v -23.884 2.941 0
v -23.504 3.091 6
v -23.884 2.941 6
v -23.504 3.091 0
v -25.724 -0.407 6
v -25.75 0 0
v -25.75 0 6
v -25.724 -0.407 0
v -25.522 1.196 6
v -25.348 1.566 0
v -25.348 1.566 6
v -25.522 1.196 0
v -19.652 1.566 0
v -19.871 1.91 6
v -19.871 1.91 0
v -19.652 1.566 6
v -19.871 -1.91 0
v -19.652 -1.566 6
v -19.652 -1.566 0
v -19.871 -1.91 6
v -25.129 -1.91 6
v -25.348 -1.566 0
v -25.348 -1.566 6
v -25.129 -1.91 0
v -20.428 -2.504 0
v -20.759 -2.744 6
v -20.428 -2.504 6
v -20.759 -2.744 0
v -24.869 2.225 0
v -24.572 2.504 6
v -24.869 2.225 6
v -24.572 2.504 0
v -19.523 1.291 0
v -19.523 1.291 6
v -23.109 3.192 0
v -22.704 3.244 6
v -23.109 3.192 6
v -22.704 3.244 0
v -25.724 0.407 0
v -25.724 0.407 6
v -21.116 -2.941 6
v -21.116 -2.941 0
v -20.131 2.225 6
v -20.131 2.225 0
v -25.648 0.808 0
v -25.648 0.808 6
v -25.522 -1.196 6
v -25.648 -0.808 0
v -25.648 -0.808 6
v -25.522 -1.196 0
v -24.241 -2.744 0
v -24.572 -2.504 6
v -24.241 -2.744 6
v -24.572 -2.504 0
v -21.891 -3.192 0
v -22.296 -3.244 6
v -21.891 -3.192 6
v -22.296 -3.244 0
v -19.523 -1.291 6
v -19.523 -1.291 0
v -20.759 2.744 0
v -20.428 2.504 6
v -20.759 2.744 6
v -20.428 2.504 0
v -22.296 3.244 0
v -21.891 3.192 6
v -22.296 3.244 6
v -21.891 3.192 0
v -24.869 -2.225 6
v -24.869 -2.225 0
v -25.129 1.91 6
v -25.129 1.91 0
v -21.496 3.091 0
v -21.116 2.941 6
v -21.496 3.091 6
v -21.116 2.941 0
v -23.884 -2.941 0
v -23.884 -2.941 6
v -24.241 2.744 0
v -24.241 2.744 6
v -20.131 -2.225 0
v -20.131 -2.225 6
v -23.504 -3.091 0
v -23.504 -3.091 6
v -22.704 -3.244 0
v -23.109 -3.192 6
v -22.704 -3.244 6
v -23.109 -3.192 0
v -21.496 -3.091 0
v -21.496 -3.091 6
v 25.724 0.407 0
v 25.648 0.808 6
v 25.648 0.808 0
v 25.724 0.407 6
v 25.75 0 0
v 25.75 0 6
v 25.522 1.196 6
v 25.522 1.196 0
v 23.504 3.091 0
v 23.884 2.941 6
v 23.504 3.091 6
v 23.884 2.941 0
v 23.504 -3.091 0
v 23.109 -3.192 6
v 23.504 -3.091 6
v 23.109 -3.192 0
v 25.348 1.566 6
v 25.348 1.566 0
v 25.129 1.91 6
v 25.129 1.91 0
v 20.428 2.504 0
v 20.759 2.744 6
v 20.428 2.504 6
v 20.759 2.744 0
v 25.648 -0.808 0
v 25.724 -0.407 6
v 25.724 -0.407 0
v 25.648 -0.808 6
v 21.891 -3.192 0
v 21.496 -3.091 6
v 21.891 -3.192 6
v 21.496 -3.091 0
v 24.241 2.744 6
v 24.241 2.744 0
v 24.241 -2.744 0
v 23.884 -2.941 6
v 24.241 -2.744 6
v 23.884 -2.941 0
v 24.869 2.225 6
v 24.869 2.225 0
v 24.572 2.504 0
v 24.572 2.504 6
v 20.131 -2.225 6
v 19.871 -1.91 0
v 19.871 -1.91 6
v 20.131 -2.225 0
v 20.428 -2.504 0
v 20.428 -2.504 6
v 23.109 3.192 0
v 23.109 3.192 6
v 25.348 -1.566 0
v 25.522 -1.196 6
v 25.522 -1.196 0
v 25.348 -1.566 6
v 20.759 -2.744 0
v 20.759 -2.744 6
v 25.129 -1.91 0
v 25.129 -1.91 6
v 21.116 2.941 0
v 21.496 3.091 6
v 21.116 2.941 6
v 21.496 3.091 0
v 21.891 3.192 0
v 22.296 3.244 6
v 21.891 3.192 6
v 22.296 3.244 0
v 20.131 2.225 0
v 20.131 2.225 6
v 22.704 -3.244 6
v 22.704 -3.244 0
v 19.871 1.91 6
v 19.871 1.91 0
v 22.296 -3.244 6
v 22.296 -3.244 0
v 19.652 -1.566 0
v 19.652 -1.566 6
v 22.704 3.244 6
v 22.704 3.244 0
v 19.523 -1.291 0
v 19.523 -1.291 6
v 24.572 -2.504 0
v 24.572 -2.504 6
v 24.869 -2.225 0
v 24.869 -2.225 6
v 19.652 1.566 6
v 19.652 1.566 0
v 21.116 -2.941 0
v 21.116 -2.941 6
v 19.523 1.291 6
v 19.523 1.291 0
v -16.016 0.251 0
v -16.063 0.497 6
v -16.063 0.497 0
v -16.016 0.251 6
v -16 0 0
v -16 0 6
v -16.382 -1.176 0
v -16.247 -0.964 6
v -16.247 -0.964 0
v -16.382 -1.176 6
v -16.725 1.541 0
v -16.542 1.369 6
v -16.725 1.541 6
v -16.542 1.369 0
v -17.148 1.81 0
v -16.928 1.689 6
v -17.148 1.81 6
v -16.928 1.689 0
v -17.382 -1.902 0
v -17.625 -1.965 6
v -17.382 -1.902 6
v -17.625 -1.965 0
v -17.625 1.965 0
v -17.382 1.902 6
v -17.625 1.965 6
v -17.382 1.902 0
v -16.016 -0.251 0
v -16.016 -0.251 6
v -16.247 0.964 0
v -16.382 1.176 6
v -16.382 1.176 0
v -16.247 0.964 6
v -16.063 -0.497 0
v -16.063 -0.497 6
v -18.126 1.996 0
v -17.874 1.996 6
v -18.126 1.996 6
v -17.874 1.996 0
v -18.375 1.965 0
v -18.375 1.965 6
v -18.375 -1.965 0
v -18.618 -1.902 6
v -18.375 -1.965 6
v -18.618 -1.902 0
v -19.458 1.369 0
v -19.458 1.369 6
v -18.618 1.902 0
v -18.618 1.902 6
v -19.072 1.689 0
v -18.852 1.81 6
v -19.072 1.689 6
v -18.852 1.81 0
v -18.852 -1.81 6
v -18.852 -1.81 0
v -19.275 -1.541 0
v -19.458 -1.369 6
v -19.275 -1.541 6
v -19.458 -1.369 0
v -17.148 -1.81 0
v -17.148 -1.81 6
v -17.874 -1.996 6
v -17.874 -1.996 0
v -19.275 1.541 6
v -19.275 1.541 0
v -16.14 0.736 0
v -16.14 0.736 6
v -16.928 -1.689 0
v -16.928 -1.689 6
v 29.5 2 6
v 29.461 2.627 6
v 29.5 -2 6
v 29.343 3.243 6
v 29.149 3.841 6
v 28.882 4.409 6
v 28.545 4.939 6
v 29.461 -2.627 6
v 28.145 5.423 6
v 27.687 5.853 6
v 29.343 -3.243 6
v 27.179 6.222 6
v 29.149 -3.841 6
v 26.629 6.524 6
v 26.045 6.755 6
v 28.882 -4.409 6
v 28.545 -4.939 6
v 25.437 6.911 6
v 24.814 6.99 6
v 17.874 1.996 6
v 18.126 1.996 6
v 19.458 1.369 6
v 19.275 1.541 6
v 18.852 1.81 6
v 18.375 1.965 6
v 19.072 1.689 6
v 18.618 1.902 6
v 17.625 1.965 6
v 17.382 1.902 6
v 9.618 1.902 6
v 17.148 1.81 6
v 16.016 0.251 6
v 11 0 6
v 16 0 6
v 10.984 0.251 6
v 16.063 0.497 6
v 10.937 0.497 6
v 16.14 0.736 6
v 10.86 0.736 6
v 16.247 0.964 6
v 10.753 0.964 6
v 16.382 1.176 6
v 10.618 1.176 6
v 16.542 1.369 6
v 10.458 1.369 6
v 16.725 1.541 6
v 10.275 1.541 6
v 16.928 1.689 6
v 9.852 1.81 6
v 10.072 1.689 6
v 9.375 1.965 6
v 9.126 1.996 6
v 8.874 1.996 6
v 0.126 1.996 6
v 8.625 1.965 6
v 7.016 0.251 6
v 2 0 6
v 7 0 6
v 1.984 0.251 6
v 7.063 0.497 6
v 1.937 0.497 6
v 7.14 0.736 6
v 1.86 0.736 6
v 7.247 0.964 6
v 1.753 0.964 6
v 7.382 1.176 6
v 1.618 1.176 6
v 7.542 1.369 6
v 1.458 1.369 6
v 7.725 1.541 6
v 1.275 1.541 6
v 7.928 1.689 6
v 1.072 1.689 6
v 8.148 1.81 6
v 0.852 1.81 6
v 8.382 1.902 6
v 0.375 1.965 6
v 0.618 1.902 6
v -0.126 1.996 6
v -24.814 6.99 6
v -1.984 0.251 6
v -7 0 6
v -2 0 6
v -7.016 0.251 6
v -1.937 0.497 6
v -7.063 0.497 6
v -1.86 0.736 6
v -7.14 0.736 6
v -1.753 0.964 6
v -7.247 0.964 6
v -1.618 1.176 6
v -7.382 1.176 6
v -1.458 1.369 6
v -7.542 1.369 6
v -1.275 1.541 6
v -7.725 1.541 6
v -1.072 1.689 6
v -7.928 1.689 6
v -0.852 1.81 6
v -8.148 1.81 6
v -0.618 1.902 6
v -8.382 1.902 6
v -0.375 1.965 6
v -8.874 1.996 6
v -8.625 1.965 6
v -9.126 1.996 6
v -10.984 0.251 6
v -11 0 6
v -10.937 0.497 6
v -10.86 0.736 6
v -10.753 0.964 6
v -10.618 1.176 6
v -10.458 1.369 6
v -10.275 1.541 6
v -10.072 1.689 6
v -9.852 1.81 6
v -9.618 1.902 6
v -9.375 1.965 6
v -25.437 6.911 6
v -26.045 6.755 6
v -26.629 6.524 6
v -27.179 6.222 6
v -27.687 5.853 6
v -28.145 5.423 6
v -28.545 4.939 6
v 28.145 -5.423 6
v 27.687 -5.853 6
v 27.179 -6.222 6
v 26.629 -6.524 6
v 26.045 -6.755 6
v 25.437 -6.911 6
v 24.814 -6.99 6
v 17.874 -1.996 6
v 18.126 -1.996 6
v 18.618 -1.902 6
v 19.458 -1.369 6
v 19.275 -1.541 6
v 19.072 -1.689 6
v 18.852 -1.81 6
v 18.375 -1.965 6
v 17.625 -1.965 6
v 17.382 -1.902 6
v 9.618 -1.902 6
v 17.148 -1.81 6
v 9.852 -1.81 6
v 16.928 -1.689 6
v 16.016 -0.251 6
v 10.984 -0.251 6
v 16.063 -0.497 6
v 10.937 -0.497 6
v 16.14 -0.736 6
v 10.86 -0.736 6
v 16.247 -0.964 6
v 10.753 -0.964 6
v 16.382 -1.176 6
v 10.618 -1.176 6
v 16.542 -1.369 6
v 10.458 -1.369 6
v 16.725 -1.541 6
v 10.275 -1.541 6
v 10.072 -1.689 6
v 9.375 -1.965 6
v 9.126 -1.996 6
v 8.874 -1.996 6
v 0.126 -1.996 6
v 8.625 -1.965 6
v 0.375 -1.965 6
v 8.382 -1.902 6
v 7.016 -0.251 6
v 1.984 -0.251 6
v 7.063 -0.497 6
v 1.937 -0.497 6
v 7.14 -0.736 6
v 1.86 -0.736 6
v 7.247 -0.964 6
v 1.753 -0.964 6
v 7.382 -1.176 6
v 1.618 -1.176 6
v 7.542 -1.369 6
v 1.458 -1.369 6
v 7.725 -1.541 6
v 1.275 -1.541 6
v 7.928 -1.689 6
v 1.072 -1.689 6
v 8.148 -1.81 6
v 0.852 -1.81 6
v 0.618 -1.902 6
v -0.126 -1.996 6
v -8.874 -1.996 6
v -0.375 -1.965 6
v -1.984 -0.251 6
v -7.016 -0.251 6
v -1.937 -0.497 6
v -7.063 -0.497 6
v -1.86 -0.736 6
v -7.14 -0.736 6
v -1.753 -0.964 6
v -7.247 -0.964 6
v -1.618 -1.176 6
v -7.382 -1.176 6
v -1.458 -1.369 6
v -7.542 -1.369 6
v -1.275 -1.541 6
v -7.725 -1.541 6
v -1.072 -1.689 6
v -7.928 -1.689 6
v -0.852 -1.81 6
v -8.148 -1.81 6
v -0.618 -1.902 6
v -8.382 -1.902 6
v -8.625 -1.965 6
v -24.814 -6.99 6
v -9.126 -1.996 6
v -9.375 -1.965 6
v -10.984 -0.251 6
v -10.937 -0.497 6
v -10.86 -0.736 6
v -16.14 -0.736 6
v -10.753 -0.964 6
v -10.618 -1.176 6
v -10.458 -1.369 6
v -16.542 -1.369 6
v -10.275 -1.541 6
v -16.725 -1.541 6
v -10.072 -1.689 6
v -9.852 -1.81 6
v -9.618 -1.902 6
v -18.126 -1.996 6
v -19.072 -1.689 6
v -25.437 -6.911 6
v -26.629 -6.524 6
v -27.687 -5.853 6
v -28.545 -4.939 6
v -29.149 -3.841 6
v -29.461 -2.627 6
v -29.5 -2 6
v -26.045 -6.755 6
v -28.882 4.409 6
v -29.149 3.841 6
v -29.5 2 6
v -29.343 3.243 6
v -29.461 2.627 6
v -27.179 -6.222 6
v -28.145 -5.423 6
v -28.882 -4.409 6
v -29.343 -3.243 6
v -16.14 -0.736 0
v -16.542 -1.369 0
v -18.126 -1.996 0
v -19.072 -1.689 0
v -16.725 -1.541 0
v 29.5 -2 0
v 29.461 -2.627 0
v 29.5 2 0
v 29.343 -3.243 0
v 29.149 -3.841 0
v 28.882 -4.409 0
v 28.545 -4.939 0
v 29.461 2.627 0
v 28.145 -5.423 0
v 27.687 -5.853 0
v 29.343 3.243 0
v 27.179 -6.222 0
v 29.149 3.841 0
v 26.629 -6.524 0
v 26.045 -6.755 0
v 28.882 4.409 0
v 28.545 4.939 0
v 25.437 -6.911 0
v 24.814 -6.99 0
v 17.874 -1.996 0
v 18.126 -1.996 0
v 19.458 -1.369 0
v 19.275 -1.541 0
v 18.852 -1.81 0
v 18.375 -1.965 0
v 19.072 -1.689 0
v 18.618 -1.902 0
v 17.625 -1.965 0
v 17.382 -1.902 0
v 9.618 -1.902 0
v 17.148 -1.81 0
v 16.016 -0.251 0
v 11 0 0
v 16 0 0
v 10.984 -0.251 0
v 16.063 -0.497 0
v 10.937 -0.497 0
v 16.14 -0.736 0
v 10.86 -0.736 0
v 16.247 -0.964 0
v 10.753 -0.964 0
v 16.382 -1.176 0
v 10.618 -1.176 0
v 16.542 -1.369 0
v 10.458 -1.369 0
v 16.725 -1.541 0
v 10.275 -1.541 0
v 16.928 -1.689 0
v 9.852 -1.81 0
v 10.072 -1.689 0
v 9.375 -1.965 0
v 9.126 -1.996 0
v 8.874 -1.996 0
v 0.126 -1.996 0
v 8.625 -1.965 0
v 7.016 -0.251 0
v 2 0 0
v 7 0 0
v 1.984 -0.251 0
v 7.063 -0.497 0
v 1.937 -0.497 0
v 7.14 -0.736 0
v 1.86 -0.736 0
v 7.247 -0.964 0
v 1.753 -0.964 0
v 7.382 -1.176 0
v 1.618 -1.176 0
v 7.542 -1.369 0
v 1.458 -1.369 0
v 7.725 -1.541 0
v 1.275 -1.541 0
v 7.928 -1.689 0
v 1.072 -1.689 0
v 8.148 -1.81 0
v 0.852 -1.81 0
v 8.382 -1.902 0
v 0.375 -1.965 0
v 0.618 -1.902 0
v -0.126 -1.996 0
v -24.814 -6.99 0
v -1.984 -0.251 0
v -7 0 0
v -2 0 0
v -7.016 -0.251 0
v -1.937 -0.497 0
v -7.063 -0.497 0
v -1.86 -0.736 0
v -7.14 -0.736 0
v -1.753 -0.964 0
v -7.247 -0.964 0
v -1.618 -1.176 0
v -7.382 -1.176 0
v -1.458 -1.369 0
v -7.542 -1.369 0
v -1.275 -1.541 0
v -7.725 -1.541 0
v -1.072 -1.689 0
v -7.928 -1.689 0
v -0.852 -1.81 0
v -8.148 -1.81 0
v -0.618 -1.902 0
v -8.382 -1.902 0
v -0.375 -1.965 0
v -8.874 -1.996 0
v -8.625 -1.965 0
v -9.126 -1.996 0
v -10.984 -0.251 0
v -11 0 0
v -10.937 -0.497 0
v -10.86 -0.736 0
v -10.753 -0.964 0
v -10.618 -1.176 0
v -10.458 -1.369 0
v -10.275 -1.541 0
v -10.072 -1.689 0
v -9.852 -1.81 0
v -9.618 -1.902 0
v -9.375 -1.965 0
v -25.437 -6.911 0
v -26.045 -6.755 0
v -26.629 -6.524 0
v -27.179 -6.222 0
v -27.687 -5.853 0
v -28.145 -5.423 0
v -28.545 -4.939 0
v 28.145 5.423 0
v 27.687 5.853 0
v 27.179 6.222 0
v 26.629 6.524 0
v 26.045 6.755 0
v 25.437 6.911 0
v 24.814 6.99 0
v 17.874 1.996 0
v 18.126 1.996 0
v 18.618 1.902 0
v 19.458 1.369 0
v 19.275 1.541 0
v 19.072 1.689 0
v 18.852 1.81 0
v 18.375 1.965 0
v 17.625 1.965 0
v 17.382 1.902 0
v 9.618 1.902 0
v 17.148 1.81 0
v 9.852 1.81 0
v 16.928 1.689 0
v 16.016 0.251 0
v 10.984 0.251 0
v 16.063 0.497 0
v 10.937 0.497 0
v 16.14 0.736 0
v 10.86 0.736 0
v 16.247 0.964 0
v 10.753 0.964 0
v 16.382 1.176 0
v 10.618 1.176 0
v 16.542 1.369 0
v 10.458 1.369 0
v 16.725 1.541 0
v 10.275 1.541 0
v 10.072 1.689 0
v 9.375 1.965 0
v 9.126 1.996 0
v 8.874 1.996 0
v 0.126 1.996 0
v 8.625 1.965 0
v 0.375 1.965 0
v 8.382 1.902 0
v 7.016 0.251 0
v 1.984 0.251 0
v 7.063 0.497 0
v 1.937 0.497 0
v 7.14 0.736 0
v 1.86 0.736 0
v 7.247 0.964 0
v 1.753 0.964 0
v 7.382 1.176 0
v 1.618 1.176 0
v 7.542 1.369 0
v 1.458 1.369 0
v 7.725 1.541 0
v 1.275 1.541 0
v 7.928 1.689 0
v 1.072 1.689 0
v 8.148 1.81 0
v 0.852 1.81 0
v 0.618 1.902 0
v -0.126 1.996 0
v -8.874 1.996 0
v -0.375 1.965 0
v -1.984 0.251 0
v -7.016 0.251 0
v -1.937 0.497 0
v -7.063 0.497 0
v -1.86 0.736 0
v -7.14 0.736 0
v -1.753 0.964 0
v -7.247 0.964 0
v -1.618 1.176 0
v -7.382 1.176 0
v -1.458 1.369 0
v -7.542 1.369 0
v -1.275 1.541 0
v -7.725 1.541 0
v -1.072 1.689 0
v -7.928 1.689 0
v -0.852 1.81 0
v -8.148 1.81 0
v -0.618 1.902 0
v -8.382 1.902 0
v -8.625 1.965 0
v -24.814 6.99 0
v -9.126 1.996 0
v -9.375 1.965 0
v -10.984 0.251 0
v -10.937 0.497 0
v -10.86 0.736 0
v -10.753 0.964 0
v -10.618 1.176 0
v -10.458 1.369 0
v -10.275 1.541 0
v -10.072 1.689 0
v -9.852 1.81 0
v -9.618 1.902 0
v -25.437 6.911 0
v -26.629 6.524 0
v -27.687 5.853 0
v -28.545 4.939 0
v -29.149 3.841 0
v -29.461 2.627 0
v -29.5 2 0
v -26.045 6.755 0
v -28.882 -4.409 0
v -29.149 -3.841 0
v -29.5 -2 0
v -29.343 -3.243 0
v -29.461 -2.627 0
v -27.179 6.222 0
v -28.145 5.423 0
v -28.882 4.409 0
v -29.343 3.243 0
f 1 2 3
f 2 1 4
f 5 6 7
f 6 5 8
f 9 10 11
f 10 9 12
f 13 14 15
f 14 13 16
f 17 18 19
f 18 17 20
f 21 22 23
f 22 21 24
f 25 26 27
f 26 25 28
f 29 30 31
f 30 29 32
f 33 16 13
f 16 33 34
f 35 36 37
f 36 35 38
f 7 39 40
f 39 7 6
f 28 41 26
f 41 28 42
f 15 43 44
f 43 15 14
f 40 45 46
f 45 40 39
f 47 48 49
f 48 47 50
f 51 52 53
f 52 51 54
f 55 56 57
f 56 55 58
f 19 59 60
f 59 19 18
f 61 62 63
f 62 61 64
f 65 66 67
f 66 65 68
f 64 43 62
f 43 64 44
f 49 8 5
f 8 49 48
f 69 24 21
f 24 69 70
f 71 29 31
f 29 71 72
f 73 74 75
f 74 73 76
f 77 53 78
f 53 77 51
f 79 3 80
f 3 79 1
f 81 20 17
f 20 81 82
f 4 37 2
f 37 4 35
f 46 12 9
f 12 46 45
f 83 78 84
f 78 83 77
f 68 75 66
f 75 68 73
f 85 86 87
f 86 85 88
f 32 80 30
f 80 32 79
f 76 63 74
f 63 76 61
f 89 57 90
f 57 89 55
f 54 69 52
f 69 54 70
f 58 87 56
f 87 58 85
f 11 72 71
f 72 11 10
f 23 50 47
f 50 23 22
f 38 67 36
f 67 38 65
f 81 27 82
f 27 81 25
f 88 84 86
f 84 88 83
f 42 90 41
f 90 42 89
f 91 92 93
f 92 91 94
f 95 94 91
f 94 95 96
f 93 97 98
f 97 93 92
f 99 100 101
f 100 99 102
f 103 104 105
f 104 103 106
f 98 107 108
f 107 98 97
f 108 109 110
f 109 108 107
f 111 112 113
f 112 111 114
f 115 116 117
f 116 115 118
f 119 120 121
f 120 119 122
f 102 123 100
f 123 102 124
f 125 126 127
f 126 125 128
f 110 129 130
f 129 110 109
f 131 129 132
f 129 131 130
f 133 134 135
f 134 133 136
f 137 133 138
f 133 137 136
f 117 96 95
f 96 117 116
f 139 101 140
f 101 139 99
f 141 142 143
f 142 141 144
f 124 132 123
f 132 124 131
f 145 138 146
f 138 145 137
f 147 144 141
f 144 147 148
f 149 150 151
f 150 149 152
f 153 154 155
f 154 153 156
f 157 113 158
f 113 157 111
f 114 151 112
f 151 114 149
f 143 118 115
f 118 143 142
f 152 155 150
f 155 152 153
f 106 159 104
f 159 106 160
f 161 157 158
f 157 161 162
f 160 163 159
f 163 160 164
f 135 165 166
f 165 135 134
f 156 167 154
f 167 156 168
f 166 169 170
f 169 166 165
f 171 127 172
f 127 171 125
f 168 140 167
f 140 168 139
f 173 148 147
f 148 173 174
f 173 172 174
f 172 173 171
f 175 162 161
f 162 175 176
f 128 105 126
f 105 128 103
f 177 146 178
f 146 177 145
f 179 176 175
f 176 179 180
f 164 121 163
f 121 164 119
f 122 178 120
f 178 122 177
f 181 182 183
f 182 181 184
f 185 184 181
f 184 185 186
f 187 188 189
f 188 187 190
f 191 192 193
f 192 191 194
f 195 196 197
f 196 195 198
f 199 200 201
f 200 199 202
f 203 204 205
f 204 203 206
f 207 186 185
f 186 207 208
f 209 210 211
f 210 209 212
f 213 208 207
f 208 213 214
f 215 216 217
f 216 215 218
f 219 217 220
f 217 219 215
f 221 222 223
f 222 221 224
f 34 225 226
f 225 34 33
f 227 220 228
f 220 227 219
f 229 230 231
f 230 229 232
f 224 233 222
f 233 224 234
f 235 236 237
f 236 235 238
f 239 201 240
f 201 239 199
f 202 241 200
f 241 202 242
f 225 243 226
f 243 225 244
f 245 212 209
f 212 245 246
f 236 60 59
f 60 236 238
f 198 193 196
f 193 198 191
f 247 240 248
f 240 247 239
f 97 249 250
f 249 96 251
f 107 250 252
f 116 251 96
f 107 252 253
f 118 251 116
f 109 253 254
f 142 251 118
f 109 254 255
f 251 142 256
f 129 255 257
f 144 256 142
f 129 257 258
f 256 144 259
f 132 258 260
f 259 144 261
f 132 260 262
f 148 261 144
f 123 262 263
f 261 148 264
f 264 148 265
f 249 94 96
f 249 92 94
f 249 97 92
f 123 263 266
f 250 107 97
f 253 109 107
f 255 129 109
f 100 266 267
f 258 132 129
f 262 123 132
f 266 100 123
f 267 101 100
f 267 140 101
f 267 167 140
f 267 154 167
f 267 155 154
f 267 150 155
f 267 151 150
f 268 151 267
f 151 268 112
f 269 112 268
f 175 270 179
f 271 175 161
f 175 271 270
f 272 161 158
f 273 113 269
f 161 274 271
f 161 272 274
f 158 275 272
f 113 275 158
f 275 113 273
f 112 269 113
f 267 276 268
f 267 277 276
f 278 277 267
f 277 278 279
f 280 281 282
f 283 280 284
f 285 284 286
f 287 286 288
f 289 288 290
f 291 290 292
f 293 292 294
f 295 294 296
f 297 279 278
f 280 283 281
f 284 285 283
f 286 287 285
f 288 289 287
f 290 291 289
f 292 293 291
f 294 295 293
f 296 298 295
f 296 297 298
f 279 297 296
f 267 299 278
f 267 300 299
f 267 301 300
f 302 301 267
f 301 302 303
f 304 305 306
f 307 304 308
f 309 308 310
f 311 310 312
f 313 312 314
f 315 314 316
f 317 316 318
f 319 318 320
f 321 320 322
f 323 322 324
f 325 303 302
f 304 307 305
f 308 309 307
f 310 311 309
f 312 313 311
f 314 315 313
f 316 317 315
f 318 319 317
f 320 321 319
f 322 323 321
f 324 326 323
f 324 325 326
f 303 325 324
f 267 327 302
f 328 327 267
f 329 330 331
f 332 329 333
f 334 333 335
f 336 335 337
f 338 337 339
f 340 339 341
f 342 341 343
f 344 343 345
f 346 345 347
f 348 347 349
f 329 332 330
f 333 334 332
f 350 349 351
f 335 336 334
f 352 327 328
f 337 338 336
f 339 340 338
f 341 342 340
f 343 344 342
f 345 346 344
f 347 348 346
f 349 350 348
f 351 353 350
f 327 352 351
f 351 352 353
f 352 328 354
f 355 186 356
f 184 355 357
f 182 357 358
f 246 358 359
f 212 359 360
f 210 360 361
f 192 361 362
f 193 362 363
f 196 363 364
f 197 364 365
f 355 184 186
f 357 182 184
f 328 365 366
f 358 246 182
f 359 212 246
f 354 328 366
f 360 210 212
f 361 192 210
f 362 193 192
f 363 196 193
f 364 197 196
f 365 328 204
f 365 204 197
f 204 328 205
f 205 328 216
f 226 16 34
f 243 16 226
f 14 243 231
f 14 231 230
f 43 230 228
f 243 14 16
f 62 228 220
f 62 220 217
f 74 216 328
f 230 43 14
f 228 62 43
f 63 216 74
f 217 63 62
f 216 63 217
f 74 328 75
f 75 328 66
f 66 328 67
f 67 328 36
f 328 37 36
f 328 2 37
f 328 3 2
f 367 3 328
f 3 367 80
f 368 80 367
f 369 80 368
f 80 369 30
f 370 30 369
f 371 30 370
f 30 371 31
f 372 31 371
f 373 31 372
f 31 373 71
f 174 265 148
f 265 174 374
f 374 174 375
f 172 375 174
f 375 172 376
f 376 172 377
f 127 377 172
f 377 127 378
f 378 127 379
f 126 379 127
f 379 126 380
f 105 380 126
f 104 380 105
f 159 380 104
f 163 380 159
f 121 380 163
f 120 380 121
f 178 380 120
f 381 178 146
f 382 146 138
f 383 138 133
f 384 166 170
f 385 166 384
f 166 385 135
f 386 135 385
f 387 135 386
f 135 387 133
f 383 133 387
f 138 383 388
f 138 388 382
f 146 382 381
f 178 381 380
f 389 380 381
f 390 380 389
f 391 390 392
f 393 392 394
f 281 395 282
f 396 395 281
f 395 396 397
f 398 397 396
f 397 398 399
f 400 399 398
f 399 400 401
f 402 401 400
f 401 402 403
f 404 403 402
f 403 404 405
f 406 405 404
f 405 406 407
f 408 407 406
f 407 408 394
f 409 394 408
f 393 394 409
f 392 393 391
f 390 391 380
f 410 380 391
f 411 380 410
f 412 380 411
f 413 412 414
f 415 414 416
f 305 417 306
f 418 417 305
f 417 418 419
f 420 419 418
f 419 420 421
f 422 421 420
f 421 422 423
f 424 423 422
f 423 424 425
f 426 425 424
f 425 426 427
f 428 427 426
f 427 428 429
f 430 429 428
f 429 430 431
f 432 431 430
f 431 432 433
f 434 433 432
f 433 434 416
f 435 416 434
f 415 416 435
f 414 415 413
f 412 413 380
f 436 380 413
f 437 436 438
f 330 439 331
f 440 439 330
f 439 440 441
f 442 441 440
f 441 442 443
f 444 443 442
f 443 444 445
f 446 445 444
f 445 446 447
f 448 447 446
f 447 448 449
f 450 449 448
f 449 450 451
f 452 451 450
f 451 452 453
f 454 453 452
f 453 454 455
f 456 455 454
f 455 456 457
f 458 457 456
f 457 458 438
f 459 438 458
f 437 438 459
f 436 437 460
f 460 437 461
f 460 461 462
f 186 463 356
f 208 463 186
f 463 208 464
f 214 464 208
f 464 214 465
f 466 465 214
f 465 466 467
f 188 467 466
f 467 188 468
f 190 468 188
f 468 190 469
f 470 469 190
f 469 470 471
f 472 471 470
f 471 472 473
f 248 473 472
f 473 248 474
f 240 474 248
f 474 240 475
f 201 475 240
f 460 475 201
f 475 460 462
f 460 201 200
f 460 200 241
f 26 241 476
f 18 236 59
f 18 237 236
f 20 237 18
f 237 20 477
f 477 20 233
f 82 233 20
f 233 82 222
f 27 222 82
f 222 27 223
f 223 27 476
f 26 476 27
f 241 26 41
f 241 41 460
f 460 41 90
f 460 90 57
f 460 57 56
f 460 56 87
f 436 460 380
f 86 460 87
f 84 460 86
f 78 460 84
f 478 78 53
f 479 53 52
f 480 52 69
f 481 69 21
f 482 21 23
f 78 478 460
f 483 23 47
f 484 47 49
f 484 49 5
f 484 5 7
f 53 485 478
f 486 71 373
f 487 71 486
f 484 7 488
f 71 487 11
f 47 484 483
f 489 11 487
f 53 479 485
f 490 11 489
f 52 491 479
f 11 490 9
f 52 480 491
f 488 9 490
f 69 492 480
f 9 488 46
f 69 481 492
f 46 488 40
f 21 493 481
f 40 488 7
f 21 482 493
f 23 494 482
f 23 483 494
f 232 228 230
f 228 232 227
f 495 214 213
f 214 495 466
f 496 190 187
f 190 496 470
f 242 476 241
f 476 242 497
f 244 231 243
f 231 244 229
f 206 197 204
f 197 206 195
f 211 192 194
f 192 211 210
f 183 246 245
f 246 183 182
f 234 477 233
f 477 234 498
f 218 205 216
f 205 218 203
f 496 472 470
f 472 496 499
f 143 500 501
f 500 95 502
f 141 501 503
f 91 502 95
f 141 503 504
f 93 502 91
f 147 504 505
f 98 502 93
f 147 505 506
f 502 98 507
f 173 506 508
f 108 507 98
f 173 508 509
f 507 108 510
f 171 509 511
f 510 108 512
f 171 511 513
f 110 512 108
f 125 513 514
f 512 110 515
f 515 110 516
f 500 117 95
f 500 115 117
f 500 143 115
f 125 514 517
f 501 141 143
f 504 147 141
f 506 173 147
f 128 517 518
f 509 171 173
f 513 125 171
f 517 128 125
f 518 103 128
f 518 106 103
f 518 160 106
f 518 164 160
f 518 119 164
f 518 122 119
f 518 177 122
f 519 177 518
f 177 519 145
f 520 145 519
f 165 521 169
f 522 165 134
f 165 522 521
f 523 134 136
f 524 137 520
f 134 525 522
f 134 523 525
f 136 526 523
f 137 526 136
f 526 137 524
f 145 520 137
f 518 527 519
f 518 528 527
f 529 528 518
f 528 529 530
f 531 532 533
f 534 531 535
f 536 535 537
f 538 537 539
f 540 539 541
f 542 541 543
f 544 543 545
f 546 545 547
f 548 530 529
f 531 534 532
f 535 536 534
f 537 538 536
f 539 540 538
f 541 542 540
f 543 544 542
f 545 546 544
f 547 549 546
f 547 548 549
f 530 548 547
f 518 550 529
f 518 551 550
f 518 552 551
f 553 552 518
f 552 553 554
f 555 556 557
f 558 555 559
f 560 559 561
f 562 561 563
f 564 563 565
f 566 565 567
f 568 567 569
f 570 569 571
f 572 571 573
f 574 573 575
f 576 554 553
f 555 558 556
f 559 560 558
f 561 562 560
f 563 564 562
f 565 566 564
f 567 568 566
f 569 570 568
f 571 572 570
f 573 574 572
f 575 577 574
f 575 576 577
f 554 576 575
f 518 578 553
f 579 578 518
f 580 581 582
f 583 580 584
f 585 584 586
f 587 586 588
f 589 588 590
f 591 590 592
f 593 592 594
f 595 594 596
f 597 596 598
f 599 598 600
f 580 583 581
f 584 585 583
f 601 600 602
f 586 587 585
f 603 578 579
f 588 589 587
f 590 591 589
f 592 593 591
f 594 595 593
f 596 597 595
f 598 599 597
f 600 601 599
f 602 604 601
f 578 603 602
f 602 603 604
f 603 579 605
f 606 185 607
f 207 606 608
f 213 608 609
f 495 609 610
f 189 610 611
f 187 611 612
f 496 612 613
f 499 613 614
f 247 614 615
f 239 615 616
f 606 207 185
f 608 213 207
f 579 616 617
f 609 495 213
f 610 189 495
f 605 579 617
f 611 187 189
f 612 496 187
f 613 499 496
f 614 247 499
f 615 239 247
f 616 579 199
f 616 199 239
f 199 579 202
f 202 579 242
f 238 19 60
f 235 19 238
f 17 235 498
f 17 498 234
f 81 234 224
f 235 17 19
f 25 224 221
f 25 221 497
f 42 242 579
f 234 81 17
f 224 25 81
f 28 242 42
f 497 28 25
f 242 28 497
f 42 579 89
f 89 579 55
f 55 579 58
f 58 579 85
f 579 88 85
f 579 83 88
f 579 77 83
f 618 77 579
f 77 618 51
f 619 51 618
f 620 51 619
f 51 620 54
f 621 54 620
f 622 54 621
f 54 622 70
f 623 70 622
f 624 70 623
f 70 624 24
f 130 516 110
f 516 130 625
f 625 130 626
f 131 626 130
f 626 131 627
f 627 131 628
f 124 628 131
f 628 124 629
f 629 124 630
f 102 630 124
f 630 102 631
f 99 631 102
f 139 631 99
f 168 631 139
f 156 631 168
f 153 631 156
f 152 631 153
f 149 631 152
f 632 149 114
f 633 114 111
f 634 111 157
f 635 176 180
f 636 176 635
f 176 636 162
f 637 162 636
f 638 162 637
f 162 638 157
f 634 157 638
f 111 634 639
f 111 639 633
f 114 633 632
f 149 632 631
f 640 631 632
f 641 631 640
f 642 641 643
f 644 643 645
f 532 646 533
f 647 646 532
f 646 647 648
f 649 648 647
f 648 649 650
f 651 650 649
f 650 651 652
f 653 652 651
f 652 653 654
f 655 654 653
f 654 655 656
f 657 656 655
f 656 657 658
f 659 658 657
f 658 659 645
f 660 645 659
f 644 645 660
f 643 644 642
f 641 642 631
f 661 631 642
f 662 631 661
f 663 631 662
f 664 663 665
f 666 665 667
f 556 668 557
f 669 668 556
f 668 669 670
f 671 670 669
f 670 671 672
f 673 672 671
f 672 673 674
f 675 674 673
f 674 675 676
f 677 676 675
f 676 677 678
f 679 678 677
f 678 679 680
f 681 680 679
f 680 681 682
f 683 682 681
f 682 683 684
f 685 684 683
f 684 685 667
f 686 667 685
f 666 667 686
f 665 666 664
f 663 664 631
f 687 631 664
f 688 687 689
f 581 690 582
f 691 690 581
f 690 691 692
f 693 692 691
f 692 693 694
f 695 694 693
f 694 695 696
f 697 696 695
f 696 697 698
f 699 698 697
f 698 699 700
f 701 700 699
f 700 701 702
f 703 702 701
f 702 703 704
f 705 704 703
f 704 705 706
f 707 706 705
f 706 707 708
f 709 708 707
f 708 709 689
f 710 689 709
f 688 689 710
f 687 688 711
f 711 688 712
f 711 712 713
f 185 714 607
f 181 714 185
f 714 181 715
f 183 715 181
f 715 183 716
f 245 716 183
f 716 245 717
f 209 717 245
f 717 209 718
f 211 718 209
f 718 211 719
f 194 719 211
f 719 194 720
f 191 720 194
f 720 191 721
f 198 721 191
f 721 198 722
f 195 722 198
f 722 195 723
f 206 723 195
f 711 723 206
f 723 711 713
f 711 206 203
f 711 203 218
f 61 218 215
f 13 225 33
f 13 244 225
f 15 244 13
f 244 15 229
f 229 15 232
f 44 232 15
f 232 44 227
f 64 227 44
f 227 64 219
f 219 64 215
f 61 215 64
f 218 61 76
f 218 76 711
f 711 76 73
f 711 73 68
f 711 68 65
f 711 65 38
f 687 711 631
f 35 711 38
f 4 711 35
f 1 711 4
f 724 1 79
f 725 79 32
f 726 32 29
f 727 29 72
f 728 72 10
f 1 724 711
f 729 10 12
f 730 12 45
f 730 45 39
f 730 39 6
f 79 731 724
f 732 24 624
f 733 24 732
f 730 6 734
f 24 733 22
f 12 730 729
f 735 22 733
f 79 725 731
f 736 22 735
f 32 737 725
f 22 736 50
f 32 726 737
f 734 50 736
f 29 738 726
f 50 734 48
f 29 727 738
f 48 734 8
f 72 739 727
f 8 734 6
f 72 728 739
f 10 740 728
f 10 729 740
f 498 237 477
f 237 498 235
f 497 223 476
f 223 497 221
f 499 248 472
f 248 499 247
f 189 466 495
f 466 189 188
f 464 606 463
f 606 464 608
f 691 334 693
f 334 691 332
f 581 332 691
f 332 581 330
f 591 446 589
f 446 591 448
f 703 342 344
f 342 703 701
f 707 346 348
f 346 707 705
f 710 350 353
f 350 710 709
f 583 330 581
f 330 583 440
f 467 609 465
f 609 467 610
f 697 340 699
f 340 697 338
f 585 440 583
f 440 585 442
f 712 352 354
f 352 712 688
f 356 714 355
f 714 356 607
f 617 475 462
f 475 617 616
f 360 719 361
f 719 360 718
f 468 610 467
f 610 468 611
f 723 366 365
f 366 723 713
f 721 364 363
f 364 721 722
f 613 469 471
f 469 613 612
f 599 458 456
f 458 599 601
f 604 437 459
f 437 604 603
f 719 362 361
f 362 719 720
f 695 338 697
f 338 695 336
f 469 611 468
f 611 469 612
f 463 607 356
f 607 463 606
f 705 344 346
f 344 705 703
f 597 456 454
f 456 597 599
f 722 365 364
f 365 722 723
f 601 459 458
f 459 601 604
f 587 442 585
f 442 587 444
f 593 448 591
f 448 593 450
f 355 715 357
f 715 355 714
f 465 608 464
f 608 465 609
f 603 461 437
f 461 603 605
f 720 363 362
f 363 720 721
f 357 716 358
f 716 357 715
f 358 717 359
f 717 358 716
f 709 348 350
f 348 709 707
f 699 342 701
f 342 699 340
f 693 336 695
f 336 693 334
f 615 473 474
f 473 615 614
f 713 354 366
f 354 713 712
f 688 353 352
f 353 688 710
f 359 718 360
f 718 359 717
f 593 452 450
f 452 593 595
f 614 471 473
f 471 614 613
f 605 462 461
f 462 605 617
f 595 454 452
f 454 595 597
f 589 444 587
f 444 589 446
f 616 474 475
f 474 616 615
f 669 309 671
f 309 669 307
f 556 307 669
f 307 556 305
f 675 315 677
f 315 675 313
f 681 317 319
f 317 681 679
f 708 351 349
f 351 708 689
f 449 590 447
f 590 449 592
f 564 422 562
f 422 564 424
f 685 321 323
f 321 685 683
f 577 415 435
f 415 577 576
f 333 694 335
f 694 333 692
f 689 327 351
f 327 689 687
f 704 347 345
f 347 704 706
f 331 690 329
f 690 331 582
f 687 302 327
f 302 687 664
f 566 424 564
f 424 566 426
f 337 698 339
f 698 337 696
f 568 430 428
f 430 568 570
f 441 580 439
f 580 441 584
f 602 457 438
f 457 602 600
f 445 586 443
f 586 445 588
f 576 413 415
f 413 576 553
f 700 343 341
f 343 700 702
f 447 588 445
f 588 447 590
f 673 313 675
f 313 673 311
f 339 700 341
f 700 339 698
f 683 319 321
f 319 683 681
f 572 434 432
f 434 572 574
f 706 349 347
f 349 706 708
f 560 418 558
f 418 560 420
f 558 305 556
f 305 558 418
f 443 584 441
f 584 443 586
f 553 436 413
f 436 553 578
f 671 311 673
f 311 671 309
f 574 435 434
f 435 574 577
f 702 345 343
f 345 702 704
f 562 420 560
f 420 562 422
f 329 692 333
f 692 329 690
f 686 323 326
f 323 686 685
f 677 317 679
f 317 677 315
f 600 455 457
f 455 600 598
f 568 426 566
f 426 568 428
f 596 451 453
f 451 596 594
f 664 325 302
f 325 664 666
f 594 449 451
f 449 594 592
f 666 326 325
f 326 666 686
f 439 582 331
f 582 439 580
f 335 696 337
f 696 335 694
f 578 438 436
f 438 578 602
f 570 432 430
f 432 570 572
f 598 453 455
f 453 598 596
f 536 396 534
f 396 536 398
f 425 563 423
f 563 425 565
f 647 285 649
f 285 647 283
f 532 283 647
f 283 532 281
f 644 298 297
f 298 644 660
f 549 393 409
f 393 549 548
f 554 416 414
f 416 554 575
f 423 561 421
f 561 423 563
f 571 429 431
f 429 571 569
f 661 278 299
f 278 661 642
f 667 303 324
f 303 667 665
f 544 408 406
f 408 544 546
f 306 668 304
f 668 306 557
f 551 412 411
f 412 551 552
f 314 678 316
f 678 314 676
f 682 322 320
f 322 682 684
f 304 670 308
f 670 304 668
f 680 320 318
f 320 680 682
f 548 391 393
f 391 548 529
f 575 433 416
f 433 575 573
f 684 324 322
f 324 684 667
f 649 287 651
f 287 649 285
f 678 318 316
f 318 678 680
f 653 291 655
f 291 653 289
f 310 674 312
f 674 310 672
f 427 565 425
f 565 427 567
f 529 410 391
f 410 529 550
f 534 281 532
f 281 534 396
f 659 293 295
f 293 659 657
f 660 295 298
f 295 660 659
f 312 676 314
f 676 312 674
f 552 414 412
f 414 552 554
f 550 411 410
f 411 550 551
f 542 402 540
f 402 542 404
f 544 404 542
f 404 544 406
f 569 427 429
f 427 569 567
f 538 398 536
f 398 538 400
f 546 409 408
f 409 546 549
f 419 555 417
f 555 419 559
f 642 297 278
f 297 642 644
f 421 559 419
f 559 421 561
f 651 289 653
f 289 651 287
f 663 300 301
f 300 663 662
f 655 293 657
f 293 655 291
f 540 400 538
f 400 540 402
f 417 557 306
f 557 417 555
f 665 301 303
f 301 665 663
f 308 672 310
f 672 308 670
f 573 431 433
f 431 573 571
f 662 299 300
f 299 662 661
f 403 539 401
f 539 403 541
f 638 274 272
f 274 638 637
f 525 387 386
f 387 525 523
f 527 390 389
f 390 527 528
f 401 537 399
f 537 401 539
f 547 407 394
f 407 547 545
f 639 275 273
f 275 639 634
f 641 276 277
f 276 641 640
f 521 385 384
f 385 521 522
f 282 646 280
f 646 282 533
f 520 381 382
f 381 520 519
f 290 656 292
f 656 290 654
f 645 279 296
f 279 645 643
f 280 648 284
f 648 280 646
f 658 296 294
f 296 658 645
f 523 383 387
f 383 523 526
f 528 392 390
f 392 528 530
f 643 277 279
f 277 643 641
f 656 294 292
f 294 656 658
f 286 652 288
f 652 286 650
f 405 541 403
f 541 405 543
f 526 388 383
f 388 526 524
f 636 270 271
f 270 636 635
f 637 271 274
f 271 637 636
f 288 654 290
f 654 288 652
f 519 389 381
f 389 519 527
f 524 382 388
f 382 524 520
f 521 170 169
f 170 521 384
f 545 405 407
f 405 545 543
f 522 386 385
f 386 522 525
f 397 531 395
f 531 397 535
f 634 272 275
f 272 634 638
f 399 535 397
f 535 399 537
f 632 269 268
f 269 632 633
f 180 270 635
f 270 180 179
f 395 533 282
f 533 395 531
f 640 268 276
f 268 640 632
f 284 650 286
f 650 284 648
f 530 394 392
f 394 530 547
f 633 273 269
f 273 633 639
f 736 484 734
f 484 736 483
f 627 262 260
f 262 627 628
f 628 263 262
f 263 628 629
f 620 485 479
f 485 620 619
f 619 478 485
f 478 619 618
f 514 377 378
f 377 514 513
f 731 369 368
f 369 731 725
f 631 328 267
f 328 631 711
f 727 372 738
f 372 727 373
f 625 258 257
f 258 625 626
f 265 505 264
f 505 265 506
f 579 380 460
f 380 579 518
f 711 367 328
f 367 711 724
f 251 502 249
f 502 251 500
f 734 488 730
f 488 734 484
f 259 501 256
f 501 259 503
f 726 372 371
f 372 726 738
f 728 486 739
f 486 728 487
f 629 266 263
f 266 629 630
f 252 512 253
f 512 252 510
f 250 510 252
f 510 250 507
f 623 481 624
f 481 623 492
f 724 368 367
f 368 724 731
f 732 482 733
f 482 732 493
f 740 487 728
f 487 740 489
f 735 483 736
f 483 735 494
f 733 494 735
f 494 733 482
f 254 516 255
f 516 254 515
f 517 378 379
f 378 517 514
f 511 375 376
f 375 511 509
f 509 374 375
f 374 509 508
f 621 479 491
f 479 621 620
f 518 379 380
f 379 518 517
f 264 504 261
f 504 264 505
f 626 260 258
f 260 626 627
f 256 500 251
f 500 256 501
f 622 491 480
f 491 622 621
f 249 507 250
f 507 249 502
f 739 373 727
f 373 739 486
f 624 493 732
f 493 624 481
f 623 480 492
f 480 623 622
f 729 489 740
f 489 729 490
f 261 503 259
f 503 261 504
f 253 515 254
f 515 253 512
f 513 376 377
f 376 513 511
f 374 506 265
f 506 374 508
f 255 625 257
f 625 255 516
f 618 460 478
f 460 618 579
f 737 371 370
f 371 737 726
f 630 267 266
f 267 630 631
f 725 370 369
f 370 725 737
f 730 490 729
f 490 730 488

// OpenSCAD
$fn = 50;


difference() {
	union() {
		hull() {
			translate(v = [-24.5000000000, 2.0000000000, 0]) {
				cylinder(h = 6, r = 5);
			}
			translate(v = [24.5000000000, 2.0000000000, 0]) {
				cylinder(h = 6, r = 5);
			}
			translate(v = [-24.5000000000, -2.0000000000, 0]) {
				cylinder(h = 6, r = 5);
			}
			translate(v = [24.5000000000, -2.0000000000, 0]) {
				cylinder(h = 6, r = 5);
			}
		}
	}
	union() {
		#translate(v = [-22.5000000000, 0.0000000000, -100.0000000000]) {
			cylinder(h = 200, r = 3.2500000000);
		}
		#translate(v = [-22.5000000000, 0.0000000000, -100.0000000000]) {
			cylinder(h = 200, r = 3.2500000000);
		}
		#translate(v = [22.5000000000, 0.0000000000, -100.0000000000]) {
			cylinder(h = 200, r = 3.2500000000);
		}
		#translate(v = [22.5000000000, 0.0000000000, -100.0000000000]) {
			cylinder(h = 200, r = 3.2500000000);
		}
		#translate(v = [-18.0000000000, 0, 0]) {
			cylinder(h = 6, r = 2.0000000000);
		}
		#translate(v = [-9.0000000000, 0, 0]) {
			cylinder(h = 6, r = 2.0000000000);
		}
		#cylinder(h = 6, r = 2.0000000000);
		#translate(v = [9.0000000000, 0, 0]) {
			cylinder(h = 6, r = 2.0000000000);
		}
		#translate(v = [18.0000000000, 0, 0]) {
			cylinder(h = 6, r = 2.0000000000);
		}
	}
}
